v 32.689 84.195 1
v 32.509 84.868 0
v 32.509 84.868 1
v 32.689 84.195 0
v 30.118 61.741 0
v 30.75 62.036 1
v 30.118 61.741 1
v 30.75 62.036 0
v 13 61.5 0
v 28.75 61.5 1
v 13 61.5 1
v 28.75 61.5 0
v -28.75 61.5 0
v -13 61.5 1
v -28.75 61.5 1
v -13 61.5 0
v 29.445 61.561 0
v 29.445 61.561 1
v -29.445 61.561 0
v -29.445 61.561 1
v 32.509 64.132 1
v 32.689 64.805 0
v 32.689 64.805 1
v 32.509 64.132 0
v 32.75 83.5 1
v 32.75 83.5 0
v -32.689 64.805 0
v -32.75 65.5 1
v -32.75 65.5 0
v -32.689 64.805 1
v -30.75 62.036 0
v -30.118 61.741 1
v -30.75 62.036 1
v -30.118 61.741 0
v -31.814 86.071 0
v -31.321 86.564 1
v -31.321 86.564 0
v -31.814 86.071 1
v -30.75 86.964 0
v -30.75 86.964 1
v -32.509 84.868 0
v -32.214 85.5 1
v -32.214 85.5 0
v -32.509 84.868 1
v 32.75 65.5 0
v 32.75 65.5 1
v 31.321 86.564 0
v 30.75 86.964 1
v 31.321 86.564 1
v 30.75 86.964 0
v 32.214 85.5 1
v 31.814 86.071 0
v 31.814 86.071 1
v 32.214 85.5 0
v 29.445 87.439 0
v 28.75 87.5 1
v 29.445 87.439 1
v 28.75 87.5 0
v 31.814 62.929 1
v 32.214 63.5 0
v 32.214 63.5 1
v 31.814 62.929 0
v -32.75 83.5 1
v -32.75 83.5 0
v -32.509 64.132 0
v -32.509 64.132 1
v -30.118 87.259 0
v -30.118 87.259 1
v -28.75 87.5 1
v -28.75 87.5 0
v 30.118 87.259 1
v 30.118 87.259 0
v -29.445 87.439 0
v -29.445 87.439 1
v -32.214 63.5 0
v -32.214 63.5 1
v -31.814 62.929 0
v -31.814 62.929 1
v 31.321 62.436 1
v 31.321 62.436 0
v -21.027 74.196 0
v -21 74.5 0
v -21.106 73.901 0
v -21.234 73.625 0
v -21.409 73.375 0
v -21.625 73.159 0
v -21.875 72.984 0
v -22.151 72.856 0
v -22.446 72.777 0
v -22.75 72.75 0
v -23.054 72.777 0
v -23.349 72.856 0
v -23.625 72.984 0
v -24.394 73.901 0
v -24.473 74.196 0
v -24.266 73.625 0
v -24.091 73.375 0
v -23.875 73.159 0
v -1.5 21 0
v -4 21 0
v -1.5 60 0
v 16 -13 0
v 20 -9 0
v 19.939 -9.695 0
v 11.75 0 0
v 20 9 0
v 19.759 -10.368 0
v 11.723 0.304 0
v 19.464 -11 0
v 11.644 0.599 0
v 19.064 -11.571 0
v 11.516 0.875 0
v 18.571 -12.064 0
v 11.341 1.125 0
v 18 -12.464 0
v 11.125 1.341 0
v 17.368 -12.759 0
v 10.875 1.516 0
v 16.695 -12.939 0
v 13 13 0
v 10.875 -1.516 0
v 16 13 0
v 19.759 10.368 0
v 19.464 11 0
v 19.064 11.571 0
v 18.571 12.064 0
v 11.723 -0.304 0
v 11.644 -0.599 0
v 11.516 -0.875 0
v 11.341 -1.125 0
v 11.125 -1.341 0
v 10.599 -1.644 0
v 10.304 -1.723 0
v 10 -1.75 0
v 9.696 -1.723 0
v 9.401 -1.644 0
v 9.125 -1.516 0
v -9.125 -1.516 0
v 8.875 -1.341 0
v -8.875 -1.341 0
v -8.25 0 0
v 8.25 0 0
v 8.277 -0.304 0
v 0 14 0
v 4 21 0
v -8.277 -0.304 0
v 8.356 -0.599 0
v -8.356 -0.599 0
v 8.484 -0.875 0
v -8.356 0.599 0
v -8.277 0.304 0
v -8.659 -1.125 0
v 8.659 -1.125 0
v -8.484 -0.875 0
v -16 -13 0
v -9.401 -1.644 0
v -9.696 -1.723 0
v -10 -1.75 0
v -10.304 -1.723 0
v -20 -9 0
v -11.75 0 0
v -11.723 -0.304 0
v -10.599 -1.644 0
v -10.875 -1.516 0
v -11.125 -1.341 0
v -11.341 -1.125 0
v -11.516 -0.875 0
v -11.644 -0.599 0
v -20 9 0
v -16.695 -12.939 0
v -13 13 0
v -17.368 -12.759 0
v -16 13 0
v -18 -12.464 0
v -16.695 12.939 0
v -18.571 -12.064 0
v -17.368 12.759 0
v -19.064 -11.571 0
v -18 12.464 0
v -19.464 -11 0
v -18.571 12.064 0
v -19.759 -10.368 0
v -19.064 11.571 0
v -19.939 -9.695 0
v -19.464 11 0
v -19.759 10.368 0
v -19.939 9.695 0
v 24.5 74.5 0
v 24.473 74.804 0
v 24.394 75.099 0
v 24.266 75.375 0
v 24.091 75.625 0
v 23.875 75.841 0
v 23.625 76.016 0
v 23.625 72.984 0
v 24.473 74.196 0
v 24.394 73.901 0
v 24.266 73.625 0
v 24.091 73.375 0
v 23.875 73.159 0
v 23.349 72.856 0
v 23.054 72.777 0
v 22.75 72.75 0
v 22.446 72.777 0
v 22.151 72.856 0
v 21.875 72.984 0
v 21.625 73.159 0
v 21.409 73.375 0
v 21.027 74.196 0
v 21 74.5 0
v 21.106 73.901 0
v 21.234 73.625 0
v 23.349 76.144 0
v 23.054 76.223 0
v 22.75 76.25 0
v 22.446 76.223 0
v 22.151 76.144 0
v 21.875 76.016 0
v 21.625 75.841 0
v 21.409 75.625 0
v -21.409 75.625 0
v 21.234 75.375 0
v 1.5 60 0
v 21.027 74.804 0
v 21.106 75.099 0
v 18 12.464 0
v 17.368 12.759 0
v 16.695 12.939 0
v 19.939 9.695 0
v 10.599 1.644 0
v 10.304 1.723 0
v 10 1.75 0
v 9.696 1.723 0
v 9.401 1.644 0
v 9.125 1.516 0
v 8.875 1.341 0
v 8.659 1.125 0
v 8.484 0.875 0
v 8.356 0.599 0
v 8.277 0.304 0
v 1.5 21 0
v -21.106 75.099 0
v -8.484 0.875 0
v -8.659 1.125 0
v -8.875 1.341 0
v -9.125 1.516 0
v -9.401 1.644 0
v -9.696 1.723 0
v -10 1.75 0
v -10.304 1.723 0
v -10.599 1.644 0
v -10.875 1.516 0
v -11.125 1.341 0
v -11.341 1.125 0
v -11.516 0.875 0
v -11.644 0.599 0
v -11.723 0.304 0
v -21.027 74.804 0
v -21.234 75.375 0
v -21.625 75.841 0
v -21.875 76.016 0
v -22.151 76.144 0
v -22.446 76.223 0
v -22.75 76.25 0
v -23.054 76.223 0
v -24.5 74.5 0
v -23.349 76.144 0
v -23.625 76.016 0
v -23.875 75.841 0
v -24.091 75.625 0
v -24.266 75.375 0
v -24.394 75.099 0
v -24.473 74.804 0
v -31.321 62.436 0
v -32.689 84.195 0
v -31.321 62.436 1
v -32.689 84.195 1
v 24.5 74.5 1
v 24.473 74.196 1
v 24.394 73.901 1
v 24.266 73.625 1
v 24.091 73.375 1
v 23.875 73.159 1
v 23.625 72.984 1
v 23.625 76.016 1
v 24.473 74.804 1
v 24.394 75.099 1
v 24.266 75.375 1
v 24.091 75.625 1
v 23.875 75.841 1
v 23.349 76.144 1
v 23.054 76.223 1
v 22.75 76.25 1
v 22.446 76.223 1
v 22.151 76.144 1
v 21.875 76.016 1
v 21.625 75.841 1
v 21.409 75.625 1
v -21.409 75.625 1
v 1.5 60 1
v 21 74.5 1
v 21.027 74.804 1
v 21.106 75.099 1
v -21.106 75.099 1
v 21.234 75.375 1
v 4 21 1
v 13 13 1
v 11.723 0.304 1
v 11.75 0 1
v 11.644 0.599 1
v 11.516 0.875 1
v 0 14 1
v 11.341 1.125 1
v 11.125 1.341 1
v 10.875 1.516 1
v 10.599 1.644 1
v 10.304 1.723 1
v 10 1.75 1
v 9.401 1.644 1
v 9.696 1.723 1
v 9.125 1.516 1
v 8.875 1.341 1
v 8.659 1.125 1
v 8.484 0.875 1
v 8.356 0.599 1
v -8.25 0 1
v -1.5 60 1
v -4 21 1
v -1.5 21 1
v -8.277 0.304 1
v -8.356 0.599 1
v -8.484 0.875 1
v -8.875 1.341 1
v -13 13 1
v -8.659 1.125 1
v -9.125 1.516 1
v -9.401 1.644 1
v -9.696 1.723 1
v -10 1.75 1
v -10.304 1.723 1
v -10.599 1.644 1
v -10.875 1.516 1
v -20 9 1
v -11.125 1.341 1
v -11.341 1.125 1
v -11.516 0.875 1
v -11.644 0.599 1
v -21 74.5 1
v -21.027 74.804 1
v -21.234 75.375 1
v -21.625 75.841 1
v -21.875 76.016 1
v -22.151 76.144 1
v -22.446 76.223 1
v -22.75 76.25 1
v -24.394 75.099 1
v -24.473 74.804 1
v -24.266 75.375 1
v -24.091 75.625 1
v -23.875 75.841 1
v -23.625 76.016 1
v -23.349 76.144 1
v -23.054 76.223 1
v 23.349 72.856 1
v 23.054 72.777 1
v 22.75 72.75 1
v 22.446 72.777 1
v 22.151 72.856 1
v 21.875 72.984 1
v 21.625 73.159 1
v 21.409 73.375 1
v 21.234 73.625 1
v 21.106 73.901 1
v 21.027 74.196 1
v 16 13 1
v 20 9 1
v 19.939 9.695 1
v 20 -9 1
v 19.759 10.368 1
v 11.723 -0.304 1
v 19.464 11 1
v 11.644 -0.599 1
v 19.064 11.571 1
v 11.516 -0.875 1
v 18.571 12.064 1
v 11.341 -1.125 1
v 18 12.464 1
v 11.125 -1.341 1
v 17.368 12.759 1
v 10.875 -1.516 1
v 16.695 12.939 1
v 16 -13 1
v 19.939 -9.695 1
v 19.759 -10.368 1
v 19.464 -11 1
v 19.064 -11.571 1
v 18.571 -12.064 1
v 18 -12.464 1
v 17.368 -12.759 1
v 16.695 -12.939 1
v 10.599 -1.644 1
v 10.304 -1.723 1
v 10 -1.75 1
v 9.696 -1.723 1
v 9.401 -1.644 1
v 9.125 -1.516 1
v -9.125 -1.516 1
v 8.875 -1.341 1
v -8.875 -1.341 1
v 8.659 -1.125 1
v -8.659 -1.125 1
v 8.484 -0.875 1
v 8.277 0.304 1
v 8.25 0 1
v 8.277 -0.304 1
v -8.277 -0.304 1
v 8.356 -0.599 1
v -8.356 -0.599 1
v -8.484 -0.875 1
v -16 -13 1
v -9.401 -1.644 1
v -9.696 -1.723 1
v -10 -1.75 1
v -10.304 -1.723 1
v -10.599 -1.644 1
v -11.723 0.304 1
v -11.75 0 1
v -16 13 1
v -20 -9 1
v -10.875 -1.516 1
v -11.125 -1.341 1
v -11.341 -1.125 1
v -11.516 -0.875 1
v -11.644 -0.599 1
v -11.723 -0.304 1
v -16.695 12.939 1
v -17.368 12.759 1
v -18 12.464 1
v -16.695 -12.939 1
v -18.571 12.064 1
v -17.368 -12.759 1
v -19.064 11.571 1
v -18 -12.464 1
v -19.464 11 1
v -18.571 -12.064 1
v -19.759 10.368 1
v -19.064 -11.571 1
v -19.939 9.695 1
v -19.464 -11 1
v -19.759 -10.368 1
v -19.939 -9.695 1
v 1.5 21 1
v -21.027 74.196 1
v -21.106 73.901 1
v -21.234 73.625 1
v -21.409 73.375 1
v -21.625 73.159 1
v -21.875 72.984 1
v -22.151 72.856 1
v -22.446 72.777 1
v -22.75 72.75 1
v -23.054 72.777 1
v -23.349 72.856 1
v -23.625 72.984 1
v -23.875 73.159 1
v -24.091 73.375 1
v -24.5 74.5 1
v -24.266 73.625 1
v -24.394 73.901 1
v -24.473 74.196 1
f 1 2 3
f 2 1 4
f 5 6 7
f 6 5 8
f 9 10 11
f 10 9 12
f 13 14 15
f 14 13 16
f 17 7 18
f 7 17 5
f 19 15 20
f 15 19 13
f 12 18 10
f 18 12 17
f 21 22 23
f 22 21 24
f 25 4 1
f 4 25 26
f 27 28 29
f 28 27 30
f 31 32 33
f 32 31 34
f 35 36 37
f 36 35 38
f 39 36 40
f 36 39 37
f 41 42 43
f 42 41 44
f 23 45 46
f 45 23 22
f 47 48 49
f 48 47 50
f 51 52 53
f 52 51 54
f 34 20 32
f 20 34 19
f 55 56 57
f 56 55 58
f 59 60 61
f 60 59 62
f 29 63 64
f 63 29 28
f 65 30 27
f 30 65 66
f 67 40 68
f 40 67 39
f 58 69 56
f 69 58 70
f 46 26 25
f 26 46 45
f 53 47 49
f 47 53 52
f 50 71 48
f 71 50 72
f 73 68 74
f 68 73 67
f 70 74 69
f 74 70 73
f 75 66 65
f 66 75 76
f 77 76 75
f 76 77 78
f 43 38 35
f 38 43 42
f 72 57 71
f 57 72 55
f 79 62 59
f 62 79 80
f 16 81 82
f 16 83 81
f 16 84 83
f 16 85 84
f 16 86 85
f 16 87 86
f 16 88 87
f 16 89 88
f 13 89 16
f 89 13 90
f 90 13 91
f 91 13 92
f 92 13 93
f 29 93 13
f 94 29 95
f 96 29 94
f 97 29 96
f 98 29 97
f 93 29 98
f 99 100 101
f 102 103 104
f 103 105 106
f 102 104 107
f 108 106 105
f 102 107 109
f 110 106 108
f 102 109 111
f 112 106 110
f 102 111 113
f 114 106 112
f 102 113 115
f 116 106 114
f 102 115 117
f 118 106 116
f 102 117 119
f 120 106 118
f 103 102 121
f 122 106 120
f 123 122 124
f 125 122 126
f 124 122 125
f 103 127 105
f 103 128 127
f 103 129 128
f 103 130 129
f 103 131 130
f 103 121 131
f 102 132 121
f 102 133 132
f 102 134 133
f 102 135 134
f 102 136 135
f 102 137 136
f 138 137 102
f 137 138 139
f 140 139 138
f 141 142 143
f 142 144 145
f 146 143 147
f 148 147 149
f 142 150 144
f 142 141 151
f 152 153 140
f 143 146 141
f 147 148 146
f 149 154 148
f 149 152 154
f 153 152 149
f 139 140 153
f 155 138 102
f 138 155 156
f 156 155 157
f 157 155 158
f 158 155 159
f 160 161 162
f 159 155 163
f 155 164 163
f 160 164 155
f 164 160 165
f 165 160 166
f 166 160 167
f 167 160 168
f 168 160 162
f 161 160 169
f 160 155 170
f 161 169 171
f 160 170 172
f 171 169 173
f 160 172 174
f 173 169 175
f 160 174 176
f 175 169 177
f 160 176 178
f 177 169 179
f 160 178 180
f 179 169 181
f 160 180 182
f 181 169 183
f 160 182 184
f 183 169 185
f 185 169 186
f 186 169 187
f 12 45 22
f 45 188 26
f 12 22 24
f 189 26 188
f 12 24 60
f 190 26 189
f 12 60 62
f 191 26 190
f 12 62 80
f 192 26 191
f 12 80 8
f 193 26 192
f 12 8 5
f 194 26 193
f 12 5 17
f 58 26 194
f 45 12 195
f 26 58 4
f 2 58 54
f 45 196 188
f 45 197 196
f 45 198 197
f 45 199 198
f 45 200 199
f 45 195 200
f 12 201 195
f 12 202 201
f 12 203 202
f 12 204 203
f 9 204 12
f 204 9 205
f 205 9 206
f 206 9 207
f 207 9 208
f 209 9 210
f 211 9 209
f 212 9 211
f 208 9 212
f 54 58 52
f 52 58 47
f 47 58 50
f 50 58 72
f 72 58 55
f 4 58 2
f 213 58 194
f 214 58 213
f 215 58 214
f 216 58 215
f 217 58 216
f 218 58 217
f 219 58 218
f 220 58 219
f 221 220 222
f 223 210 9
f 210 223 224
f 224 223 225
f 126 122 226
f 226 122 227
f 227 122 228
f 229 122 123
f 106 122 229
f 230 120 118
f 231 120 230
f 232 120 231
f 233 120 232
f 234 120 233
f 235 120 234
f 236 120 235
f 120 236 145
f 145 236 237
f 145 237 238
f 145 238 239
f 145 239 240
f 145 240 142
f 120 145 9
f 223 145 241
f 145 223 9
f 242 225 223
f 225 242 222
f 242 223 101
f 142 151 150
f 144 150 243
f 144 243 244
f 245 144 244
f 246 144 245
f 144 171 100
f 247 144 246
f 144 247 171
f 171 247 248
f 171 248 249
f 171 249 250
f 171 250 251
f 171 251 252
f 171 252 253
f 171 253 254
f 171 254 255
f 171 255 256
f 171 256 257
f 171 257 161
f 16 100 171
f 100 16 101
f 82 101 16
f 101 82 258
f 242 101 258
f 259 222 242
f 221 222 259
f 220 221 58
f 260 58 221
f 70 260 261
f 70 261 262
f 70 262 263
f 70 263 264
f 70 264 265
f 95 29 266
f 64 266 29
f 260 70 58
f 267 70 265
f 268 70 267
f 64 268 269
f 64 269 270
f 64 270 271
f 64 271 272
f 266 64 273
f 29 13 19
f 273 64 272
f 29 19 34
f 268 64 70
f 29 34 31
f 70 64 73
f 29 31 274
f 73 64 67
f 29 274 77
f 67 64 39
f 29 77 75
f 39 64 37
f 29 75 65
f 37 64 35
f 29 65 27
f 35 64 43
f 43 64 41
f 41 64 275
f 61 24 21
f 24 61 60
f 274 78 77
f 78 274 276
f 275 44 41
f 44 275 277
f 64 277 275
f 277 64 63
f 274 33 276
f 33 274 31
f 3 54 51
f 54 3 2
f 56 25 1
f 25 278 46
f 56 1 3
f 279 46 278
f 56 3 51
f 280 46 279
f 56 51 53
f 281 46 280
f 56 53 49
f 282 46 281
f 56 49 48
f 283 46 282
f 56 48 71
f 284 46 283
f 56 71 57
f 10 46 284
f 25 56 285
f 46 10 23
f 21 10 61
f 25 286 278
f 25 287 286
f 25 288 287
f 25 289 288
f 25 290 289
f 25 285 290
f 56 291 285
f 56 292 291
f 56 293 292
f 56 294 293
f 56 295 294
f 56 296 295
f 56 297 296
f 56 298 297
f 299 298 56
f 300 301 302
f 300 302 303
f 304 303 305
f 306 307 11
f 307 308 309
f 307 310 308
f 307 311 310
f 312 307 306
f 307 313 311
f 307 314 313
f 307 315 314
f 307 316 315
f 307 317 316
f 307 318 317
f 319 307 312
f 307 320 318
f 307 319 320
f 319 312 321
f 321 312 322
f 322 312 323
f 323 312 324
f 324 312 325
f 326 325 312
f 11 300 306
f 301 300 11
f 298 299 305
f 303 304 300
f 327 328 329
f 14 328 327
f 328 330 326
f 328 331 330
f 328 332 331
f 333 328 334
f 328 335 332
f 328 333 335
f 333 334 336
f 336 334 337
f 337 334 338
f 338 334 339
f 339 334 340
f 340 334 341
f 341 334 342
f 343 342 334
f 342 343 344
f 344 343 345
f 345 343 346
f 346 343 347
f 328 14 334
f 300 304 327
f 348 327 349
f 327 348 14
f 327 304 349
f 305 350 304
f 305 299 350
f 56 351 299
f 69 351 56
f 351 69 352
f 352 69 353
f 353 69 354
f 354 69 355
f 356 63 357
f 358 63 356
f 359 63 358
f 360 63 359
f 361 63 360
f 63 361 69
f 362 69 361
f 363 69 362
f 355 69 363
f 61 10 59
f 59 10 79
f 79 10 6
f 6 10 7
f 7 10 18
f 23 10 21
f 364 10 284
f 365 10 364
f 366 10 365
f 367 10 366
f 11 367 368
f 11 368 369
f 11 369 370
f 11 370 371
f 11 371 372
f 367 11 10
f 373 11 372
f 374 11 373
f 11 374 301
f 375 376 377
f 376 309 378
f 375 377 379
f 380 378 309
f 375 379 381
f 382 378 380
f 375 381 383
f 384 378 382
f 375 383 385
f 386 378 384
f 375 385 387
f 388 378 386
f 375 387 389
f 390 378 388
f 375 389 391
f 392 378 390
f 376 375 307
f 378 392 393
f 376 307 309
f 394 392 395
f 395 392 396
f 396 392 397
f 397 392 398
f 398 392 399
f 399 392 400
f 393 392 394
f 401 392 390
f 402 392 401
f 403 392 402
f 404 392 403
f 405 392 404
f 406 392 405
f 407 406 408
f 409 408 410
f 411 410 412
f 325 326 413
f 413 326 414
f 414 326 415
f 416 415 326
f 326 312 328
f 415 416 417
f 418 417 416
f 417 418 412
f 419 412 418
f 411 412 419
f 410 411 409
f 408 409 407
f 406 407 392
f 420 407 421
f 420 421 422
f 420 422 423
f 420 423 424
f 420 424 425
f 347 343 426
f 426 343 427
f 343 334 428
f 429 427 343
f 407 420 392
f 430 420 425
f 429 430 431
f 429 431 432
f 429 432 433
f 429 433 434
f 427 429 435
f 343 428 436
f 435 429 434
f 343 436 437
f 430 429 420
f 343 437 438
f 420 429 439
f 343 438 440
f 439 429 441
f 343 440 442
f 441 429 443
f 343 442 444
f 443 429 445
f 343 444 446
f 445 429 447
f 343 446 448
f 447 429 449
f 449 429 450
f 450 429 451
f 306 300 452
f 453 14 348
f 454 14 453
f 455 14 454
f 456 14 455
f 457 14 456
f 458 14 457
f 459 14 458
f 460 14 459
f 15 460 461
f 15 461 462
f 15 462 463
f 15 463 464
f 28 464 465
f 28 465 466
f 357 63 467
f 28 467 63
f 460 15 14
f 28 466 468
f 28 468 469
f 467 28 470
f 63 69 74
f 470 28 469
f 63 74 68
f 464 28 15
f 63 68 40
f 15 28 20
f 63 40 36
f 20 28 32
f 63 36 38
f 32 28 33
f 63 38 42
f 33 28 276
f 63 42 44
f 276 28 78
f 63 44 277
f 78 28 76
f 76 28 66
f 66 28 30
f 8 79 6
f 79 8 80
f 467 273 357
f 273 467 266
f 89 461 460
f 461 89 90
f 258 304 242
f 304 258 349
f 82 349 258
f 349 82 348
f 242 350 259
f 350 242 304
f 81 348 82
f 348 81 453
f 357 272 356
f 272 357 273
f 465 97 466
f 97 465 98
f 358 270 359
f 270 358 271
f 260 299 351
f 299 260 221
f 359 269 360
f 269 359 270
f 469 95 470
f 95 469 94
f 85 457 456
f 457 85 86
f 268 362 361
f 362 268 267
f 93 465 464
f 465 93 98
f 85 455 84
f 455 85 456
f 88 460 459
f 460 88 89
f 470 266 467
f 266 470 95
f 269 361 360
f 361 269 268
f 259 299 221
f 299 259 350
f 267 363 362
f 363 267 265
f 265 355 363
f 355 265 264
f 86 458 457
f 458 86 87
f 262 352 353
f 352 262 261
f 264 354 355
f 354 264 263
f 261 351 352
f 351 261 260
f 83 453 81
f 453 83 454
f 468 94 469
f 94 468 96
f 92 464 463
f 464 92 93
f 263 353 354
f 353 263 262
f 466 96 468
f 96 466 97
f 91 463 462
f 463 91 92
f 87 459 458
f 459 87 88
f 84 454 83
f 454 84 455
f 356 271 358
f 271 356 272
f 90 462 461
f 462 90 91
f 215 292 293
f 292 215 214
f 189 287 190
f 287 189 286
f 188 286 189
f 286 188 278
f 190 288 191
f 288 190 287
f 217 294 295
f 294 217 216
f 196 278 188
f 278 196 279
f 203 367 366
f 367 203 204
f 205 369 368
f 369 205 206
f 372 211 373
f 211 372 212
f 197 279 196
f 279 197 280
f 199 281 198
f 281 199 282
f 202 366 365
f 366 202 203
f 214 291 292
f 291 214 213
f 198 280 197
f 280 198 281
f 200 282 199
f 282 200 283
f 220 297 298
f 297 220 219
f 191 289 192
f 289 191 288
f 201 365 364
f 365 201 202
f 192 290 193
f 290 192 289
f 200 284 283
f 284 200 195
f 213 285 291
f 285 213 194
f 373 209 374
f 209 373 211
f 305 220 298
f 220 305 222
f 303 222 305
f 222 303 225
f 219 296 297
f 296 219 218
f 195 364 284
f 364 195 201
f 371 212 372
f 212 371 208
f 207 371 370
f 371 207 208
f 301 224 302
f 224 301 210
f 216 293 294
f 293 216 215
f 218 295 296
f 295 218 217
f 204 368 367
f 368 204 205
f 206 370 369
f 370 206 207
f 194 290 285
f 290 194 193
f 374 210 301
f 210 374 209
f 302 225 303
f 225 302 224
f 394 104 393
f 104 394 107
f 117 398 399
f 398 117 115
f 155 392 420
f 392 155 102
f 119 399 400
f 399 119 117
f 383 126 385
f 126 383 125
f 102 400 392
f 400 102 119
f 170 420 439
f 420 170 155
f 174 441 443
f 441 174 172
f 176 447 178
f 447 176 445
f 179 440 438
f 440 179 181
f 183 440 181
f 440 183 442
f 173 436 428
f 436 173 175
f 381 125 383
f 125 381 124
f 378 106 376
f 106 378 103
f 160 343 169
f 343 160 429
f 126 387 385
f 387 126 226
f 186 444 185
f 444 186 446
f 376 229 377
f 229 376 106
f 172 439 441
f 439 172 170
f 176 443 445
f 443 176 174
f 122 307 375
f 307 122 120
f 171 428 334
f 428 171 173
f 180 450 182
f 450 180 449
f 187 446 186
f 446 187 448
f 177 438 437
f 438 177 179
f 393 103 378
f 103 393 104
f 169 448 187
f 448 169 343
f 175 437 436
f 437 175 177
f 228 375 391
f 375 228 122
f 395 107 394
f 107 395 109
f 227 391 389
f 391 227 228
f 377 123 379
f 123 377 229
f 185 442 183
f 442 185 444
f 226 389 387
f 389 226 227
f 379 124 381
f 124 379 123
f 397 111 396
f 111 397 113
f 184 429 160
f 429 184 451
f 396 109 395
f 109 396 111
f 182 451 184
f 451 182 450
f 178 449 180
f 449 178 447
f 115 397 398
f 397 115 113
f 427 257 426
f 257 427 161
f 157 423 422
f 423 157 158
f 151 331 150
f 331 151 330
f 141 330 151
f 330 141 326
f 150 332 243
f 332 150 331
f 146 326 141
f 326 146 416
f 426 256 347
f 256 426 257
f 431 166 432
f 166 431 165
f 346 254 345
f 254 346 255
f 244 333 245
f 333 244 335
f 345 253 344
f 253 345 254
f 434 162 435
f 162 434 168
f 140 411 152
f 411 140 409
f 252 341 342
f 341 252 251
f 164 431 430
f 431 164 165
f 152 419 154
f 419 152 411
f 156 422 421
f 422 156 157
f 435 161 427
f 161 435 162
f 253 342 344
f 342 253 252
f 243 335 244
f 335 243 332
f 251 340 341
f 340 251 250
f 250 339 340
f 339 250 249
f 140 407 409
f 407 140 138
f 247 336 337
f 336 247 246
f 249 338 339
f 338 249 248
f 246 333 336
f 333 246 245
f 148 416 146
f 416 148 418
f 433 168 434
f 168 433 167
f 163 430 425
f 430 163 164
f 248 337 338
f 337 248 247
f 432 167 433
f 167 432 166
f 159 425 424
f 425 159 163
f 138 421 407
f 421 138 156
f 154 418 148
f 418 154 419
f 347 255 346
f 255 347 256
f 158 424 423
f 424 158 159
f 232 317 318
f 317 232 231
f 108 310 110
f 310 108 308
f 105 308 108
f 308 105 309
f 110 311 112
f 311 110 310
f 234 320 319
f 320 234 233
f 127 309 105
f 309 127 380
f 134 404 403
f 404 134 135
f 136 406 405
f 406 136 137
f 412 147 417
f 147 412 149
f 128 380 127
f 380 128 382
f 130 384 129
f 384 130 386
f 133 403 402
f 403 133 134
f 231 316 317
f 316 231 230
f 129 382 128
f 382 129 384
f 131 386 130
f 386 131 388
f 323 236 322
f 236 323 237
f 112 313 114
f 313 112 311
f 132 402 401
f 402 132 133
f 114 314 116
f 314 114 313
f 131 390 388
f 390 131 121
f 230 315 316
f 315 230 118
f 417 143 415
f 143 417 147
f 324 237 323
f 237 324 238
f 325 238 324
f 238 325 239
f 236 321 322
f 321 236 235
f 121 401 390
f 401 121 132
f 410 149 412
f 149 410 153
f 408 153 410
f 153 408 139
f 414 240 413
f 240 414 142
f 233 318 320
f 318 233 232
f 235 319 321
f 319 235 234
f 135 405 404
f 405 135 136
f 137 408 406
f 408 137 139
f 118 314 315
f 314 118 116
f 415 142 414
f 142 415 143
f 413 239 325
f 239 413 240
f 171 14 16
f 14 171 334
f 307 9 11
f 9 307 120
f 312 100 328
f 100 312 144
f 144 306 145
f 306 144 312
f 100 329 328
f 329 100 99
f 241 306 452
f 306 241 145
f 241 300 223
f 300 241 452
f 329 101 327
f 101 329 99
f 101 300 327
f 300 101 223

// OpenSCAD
/*
 * Support Dremel
 */

use <MCAD/3d_triangle.scad>
 
$fn = 36;
entraxe_bottom = 20;
entraxe_top = 45.5;

entraxe_vertical = 74.5;
slack = 0.5;
height = 26;
hole_dia = 3;
thickness = 1;
width_top = entraxe_top + 20;
width_bottom = entraxe_bottom + 20;
round = 4;

/**
 * A plate potentially with rounded corners
 */
module plate (size = [1, 2, 3], rounding = 1, center = false) {
	
	translation = (center) ? 0 : rounding;
	
	translate([translation, translation, 0])
	linear_extrude(size[2])
	offset(r = rounding)
	square (size = [size[0] - rounding *2, size[1] - rounding * 2], center = center);
}

/**
 * A plate potentially with rounded corners
 * and two holes
 */
module two_holes_plate (size = [1, 2, 3], rounding = 1, center = false, distance = 10, hole_dia = 5) {

	difference () {
		plate(size = size, rounding = rounding, center = center);
		
		x_trans = (center) ? 0 : size[0]; 
		y_translation = (center) ? 0 : size[1] / 2;
		z_translation = (center) ? size[2] / 2  : - thickness / 2;
		
		translate([x_trans / 2 - distance, y_translation, z_translation])
		cylinder(h = thickness * 2, d = hole_dia, center = center);

		translate([x_trans / 2 + distance, y_translation, z_translation])
		cylinder(h = thickness * 2, d = hole_dia, center = center);
	}
}

/*
 * generate the base shape of a H letter
 */
module hache () {
	translate([0, entraxe_vertical, 0])
	two_holes_plate([width_top, height, thickness], rounding = round, center = true, distance = entraxe_top / 2, hole_dia=3 + slack);
	two_holes_plate([width_bottom, height, thickness], rounding = round, center = true, distance = entraxe_bottom / 2, hole_dia=3 + slack);
	
	len = entraxe_vertical - height + 0.2;
	translate([0, (len + height) / 2  - 0.1, 0])
	linear_extrude(thickness)
	square(size = [height, len], center = true);
}

difference () {
	hache();
	
	translate([0, 14, -1])
	3dtri_draw ( Acord = [0, 0, 0], Bcord = [4, 7, 0], Ccord = [-4, 7, 0], h =15) ;
	
	translate([0, 40, -1])
	cube(size = [3, 40, 15], center = true);
}
